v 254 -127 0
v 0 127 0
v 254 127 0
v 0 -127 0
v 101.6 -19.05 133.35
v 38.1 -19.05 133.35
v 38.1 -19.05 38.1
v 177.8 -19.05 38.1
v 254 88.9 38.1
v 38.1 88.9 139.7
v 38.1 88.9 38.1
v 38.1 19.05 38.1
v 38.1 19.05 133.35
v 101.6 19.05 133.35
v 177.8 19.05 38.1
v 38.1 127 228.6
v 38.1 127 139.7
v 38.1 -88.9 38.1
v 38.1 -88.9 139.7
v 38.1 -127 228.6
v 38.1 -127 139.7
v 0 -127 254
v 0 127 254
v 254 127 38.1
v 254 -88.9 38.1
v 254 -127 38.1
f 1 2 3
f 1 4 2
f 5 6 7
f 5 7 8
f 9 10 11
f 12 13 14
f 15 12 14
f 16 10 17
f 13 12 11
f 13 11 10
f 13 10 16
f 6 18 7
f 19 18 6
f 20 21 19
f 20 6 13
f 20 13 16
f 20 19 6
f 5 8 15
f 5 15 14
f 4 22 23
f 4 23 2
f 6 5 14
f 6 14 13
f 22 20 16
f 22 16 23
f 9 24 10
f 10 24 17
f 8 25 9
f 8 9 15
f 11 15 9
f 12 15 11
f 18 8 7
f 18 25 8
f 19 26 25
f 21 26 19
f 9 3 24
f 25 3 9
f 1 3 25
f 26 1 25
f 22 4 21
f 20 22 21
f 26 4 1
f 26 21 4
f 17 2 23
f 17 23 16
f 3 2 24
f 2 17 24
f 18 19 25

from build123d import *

# Parameters (mm, degrees)
F1_DEPTH = 127
F3_DEPTH = 38.1
F4_DEPTH = 19.05


# Not quite as in the source:
# - a pattern or mirror of a feature is missing from the dataset's text; its kind, count and spacing are read off the source's solid


with BuildPart() as f1:
    # F0 (on Front) → F1 (new body, symmetric)
    with BuildSketch(Plane.XZ):
        Polygon((0, 254), (0, 0), (254, 0), (254, 38.1), (177.8, 38.1), (38.1, 38.1), (38.1, 133.35), (38.1, 228.6), align=None)
    extrude(amount=F1_DEPTH, both=True)

    # F2 (on face) → F3 (join)
    with BuildSketch(Plane.XZ.offset(127)):
        Polygon((254, 38.1), (38.1, 139.7), (38.1, 38.1), align=None)
    f3 = extrude(amount=-F3_DEPTH)

    # F3_copies: F3 across plane
    add(f3.mirror(Plane.ZX))

    # F0 (on Front) → F4 (join, symmetric)
    with BuildSketch(Plane.XZ):
        Polygon((0, 254), (0, 0), (254, 0), (254, 38.1), (177.8, 38.1), (38.1, 38.1), (38.1, 133.35), (38.1, 228.6), align=None)
        Polygon((101.6, 133.35), (38.1, 133.35), (38.1, 38.1), (177.8, 38.1), align=None)
    extrude(amount=F4_DEPTH, both=True)


solid = f1.part
